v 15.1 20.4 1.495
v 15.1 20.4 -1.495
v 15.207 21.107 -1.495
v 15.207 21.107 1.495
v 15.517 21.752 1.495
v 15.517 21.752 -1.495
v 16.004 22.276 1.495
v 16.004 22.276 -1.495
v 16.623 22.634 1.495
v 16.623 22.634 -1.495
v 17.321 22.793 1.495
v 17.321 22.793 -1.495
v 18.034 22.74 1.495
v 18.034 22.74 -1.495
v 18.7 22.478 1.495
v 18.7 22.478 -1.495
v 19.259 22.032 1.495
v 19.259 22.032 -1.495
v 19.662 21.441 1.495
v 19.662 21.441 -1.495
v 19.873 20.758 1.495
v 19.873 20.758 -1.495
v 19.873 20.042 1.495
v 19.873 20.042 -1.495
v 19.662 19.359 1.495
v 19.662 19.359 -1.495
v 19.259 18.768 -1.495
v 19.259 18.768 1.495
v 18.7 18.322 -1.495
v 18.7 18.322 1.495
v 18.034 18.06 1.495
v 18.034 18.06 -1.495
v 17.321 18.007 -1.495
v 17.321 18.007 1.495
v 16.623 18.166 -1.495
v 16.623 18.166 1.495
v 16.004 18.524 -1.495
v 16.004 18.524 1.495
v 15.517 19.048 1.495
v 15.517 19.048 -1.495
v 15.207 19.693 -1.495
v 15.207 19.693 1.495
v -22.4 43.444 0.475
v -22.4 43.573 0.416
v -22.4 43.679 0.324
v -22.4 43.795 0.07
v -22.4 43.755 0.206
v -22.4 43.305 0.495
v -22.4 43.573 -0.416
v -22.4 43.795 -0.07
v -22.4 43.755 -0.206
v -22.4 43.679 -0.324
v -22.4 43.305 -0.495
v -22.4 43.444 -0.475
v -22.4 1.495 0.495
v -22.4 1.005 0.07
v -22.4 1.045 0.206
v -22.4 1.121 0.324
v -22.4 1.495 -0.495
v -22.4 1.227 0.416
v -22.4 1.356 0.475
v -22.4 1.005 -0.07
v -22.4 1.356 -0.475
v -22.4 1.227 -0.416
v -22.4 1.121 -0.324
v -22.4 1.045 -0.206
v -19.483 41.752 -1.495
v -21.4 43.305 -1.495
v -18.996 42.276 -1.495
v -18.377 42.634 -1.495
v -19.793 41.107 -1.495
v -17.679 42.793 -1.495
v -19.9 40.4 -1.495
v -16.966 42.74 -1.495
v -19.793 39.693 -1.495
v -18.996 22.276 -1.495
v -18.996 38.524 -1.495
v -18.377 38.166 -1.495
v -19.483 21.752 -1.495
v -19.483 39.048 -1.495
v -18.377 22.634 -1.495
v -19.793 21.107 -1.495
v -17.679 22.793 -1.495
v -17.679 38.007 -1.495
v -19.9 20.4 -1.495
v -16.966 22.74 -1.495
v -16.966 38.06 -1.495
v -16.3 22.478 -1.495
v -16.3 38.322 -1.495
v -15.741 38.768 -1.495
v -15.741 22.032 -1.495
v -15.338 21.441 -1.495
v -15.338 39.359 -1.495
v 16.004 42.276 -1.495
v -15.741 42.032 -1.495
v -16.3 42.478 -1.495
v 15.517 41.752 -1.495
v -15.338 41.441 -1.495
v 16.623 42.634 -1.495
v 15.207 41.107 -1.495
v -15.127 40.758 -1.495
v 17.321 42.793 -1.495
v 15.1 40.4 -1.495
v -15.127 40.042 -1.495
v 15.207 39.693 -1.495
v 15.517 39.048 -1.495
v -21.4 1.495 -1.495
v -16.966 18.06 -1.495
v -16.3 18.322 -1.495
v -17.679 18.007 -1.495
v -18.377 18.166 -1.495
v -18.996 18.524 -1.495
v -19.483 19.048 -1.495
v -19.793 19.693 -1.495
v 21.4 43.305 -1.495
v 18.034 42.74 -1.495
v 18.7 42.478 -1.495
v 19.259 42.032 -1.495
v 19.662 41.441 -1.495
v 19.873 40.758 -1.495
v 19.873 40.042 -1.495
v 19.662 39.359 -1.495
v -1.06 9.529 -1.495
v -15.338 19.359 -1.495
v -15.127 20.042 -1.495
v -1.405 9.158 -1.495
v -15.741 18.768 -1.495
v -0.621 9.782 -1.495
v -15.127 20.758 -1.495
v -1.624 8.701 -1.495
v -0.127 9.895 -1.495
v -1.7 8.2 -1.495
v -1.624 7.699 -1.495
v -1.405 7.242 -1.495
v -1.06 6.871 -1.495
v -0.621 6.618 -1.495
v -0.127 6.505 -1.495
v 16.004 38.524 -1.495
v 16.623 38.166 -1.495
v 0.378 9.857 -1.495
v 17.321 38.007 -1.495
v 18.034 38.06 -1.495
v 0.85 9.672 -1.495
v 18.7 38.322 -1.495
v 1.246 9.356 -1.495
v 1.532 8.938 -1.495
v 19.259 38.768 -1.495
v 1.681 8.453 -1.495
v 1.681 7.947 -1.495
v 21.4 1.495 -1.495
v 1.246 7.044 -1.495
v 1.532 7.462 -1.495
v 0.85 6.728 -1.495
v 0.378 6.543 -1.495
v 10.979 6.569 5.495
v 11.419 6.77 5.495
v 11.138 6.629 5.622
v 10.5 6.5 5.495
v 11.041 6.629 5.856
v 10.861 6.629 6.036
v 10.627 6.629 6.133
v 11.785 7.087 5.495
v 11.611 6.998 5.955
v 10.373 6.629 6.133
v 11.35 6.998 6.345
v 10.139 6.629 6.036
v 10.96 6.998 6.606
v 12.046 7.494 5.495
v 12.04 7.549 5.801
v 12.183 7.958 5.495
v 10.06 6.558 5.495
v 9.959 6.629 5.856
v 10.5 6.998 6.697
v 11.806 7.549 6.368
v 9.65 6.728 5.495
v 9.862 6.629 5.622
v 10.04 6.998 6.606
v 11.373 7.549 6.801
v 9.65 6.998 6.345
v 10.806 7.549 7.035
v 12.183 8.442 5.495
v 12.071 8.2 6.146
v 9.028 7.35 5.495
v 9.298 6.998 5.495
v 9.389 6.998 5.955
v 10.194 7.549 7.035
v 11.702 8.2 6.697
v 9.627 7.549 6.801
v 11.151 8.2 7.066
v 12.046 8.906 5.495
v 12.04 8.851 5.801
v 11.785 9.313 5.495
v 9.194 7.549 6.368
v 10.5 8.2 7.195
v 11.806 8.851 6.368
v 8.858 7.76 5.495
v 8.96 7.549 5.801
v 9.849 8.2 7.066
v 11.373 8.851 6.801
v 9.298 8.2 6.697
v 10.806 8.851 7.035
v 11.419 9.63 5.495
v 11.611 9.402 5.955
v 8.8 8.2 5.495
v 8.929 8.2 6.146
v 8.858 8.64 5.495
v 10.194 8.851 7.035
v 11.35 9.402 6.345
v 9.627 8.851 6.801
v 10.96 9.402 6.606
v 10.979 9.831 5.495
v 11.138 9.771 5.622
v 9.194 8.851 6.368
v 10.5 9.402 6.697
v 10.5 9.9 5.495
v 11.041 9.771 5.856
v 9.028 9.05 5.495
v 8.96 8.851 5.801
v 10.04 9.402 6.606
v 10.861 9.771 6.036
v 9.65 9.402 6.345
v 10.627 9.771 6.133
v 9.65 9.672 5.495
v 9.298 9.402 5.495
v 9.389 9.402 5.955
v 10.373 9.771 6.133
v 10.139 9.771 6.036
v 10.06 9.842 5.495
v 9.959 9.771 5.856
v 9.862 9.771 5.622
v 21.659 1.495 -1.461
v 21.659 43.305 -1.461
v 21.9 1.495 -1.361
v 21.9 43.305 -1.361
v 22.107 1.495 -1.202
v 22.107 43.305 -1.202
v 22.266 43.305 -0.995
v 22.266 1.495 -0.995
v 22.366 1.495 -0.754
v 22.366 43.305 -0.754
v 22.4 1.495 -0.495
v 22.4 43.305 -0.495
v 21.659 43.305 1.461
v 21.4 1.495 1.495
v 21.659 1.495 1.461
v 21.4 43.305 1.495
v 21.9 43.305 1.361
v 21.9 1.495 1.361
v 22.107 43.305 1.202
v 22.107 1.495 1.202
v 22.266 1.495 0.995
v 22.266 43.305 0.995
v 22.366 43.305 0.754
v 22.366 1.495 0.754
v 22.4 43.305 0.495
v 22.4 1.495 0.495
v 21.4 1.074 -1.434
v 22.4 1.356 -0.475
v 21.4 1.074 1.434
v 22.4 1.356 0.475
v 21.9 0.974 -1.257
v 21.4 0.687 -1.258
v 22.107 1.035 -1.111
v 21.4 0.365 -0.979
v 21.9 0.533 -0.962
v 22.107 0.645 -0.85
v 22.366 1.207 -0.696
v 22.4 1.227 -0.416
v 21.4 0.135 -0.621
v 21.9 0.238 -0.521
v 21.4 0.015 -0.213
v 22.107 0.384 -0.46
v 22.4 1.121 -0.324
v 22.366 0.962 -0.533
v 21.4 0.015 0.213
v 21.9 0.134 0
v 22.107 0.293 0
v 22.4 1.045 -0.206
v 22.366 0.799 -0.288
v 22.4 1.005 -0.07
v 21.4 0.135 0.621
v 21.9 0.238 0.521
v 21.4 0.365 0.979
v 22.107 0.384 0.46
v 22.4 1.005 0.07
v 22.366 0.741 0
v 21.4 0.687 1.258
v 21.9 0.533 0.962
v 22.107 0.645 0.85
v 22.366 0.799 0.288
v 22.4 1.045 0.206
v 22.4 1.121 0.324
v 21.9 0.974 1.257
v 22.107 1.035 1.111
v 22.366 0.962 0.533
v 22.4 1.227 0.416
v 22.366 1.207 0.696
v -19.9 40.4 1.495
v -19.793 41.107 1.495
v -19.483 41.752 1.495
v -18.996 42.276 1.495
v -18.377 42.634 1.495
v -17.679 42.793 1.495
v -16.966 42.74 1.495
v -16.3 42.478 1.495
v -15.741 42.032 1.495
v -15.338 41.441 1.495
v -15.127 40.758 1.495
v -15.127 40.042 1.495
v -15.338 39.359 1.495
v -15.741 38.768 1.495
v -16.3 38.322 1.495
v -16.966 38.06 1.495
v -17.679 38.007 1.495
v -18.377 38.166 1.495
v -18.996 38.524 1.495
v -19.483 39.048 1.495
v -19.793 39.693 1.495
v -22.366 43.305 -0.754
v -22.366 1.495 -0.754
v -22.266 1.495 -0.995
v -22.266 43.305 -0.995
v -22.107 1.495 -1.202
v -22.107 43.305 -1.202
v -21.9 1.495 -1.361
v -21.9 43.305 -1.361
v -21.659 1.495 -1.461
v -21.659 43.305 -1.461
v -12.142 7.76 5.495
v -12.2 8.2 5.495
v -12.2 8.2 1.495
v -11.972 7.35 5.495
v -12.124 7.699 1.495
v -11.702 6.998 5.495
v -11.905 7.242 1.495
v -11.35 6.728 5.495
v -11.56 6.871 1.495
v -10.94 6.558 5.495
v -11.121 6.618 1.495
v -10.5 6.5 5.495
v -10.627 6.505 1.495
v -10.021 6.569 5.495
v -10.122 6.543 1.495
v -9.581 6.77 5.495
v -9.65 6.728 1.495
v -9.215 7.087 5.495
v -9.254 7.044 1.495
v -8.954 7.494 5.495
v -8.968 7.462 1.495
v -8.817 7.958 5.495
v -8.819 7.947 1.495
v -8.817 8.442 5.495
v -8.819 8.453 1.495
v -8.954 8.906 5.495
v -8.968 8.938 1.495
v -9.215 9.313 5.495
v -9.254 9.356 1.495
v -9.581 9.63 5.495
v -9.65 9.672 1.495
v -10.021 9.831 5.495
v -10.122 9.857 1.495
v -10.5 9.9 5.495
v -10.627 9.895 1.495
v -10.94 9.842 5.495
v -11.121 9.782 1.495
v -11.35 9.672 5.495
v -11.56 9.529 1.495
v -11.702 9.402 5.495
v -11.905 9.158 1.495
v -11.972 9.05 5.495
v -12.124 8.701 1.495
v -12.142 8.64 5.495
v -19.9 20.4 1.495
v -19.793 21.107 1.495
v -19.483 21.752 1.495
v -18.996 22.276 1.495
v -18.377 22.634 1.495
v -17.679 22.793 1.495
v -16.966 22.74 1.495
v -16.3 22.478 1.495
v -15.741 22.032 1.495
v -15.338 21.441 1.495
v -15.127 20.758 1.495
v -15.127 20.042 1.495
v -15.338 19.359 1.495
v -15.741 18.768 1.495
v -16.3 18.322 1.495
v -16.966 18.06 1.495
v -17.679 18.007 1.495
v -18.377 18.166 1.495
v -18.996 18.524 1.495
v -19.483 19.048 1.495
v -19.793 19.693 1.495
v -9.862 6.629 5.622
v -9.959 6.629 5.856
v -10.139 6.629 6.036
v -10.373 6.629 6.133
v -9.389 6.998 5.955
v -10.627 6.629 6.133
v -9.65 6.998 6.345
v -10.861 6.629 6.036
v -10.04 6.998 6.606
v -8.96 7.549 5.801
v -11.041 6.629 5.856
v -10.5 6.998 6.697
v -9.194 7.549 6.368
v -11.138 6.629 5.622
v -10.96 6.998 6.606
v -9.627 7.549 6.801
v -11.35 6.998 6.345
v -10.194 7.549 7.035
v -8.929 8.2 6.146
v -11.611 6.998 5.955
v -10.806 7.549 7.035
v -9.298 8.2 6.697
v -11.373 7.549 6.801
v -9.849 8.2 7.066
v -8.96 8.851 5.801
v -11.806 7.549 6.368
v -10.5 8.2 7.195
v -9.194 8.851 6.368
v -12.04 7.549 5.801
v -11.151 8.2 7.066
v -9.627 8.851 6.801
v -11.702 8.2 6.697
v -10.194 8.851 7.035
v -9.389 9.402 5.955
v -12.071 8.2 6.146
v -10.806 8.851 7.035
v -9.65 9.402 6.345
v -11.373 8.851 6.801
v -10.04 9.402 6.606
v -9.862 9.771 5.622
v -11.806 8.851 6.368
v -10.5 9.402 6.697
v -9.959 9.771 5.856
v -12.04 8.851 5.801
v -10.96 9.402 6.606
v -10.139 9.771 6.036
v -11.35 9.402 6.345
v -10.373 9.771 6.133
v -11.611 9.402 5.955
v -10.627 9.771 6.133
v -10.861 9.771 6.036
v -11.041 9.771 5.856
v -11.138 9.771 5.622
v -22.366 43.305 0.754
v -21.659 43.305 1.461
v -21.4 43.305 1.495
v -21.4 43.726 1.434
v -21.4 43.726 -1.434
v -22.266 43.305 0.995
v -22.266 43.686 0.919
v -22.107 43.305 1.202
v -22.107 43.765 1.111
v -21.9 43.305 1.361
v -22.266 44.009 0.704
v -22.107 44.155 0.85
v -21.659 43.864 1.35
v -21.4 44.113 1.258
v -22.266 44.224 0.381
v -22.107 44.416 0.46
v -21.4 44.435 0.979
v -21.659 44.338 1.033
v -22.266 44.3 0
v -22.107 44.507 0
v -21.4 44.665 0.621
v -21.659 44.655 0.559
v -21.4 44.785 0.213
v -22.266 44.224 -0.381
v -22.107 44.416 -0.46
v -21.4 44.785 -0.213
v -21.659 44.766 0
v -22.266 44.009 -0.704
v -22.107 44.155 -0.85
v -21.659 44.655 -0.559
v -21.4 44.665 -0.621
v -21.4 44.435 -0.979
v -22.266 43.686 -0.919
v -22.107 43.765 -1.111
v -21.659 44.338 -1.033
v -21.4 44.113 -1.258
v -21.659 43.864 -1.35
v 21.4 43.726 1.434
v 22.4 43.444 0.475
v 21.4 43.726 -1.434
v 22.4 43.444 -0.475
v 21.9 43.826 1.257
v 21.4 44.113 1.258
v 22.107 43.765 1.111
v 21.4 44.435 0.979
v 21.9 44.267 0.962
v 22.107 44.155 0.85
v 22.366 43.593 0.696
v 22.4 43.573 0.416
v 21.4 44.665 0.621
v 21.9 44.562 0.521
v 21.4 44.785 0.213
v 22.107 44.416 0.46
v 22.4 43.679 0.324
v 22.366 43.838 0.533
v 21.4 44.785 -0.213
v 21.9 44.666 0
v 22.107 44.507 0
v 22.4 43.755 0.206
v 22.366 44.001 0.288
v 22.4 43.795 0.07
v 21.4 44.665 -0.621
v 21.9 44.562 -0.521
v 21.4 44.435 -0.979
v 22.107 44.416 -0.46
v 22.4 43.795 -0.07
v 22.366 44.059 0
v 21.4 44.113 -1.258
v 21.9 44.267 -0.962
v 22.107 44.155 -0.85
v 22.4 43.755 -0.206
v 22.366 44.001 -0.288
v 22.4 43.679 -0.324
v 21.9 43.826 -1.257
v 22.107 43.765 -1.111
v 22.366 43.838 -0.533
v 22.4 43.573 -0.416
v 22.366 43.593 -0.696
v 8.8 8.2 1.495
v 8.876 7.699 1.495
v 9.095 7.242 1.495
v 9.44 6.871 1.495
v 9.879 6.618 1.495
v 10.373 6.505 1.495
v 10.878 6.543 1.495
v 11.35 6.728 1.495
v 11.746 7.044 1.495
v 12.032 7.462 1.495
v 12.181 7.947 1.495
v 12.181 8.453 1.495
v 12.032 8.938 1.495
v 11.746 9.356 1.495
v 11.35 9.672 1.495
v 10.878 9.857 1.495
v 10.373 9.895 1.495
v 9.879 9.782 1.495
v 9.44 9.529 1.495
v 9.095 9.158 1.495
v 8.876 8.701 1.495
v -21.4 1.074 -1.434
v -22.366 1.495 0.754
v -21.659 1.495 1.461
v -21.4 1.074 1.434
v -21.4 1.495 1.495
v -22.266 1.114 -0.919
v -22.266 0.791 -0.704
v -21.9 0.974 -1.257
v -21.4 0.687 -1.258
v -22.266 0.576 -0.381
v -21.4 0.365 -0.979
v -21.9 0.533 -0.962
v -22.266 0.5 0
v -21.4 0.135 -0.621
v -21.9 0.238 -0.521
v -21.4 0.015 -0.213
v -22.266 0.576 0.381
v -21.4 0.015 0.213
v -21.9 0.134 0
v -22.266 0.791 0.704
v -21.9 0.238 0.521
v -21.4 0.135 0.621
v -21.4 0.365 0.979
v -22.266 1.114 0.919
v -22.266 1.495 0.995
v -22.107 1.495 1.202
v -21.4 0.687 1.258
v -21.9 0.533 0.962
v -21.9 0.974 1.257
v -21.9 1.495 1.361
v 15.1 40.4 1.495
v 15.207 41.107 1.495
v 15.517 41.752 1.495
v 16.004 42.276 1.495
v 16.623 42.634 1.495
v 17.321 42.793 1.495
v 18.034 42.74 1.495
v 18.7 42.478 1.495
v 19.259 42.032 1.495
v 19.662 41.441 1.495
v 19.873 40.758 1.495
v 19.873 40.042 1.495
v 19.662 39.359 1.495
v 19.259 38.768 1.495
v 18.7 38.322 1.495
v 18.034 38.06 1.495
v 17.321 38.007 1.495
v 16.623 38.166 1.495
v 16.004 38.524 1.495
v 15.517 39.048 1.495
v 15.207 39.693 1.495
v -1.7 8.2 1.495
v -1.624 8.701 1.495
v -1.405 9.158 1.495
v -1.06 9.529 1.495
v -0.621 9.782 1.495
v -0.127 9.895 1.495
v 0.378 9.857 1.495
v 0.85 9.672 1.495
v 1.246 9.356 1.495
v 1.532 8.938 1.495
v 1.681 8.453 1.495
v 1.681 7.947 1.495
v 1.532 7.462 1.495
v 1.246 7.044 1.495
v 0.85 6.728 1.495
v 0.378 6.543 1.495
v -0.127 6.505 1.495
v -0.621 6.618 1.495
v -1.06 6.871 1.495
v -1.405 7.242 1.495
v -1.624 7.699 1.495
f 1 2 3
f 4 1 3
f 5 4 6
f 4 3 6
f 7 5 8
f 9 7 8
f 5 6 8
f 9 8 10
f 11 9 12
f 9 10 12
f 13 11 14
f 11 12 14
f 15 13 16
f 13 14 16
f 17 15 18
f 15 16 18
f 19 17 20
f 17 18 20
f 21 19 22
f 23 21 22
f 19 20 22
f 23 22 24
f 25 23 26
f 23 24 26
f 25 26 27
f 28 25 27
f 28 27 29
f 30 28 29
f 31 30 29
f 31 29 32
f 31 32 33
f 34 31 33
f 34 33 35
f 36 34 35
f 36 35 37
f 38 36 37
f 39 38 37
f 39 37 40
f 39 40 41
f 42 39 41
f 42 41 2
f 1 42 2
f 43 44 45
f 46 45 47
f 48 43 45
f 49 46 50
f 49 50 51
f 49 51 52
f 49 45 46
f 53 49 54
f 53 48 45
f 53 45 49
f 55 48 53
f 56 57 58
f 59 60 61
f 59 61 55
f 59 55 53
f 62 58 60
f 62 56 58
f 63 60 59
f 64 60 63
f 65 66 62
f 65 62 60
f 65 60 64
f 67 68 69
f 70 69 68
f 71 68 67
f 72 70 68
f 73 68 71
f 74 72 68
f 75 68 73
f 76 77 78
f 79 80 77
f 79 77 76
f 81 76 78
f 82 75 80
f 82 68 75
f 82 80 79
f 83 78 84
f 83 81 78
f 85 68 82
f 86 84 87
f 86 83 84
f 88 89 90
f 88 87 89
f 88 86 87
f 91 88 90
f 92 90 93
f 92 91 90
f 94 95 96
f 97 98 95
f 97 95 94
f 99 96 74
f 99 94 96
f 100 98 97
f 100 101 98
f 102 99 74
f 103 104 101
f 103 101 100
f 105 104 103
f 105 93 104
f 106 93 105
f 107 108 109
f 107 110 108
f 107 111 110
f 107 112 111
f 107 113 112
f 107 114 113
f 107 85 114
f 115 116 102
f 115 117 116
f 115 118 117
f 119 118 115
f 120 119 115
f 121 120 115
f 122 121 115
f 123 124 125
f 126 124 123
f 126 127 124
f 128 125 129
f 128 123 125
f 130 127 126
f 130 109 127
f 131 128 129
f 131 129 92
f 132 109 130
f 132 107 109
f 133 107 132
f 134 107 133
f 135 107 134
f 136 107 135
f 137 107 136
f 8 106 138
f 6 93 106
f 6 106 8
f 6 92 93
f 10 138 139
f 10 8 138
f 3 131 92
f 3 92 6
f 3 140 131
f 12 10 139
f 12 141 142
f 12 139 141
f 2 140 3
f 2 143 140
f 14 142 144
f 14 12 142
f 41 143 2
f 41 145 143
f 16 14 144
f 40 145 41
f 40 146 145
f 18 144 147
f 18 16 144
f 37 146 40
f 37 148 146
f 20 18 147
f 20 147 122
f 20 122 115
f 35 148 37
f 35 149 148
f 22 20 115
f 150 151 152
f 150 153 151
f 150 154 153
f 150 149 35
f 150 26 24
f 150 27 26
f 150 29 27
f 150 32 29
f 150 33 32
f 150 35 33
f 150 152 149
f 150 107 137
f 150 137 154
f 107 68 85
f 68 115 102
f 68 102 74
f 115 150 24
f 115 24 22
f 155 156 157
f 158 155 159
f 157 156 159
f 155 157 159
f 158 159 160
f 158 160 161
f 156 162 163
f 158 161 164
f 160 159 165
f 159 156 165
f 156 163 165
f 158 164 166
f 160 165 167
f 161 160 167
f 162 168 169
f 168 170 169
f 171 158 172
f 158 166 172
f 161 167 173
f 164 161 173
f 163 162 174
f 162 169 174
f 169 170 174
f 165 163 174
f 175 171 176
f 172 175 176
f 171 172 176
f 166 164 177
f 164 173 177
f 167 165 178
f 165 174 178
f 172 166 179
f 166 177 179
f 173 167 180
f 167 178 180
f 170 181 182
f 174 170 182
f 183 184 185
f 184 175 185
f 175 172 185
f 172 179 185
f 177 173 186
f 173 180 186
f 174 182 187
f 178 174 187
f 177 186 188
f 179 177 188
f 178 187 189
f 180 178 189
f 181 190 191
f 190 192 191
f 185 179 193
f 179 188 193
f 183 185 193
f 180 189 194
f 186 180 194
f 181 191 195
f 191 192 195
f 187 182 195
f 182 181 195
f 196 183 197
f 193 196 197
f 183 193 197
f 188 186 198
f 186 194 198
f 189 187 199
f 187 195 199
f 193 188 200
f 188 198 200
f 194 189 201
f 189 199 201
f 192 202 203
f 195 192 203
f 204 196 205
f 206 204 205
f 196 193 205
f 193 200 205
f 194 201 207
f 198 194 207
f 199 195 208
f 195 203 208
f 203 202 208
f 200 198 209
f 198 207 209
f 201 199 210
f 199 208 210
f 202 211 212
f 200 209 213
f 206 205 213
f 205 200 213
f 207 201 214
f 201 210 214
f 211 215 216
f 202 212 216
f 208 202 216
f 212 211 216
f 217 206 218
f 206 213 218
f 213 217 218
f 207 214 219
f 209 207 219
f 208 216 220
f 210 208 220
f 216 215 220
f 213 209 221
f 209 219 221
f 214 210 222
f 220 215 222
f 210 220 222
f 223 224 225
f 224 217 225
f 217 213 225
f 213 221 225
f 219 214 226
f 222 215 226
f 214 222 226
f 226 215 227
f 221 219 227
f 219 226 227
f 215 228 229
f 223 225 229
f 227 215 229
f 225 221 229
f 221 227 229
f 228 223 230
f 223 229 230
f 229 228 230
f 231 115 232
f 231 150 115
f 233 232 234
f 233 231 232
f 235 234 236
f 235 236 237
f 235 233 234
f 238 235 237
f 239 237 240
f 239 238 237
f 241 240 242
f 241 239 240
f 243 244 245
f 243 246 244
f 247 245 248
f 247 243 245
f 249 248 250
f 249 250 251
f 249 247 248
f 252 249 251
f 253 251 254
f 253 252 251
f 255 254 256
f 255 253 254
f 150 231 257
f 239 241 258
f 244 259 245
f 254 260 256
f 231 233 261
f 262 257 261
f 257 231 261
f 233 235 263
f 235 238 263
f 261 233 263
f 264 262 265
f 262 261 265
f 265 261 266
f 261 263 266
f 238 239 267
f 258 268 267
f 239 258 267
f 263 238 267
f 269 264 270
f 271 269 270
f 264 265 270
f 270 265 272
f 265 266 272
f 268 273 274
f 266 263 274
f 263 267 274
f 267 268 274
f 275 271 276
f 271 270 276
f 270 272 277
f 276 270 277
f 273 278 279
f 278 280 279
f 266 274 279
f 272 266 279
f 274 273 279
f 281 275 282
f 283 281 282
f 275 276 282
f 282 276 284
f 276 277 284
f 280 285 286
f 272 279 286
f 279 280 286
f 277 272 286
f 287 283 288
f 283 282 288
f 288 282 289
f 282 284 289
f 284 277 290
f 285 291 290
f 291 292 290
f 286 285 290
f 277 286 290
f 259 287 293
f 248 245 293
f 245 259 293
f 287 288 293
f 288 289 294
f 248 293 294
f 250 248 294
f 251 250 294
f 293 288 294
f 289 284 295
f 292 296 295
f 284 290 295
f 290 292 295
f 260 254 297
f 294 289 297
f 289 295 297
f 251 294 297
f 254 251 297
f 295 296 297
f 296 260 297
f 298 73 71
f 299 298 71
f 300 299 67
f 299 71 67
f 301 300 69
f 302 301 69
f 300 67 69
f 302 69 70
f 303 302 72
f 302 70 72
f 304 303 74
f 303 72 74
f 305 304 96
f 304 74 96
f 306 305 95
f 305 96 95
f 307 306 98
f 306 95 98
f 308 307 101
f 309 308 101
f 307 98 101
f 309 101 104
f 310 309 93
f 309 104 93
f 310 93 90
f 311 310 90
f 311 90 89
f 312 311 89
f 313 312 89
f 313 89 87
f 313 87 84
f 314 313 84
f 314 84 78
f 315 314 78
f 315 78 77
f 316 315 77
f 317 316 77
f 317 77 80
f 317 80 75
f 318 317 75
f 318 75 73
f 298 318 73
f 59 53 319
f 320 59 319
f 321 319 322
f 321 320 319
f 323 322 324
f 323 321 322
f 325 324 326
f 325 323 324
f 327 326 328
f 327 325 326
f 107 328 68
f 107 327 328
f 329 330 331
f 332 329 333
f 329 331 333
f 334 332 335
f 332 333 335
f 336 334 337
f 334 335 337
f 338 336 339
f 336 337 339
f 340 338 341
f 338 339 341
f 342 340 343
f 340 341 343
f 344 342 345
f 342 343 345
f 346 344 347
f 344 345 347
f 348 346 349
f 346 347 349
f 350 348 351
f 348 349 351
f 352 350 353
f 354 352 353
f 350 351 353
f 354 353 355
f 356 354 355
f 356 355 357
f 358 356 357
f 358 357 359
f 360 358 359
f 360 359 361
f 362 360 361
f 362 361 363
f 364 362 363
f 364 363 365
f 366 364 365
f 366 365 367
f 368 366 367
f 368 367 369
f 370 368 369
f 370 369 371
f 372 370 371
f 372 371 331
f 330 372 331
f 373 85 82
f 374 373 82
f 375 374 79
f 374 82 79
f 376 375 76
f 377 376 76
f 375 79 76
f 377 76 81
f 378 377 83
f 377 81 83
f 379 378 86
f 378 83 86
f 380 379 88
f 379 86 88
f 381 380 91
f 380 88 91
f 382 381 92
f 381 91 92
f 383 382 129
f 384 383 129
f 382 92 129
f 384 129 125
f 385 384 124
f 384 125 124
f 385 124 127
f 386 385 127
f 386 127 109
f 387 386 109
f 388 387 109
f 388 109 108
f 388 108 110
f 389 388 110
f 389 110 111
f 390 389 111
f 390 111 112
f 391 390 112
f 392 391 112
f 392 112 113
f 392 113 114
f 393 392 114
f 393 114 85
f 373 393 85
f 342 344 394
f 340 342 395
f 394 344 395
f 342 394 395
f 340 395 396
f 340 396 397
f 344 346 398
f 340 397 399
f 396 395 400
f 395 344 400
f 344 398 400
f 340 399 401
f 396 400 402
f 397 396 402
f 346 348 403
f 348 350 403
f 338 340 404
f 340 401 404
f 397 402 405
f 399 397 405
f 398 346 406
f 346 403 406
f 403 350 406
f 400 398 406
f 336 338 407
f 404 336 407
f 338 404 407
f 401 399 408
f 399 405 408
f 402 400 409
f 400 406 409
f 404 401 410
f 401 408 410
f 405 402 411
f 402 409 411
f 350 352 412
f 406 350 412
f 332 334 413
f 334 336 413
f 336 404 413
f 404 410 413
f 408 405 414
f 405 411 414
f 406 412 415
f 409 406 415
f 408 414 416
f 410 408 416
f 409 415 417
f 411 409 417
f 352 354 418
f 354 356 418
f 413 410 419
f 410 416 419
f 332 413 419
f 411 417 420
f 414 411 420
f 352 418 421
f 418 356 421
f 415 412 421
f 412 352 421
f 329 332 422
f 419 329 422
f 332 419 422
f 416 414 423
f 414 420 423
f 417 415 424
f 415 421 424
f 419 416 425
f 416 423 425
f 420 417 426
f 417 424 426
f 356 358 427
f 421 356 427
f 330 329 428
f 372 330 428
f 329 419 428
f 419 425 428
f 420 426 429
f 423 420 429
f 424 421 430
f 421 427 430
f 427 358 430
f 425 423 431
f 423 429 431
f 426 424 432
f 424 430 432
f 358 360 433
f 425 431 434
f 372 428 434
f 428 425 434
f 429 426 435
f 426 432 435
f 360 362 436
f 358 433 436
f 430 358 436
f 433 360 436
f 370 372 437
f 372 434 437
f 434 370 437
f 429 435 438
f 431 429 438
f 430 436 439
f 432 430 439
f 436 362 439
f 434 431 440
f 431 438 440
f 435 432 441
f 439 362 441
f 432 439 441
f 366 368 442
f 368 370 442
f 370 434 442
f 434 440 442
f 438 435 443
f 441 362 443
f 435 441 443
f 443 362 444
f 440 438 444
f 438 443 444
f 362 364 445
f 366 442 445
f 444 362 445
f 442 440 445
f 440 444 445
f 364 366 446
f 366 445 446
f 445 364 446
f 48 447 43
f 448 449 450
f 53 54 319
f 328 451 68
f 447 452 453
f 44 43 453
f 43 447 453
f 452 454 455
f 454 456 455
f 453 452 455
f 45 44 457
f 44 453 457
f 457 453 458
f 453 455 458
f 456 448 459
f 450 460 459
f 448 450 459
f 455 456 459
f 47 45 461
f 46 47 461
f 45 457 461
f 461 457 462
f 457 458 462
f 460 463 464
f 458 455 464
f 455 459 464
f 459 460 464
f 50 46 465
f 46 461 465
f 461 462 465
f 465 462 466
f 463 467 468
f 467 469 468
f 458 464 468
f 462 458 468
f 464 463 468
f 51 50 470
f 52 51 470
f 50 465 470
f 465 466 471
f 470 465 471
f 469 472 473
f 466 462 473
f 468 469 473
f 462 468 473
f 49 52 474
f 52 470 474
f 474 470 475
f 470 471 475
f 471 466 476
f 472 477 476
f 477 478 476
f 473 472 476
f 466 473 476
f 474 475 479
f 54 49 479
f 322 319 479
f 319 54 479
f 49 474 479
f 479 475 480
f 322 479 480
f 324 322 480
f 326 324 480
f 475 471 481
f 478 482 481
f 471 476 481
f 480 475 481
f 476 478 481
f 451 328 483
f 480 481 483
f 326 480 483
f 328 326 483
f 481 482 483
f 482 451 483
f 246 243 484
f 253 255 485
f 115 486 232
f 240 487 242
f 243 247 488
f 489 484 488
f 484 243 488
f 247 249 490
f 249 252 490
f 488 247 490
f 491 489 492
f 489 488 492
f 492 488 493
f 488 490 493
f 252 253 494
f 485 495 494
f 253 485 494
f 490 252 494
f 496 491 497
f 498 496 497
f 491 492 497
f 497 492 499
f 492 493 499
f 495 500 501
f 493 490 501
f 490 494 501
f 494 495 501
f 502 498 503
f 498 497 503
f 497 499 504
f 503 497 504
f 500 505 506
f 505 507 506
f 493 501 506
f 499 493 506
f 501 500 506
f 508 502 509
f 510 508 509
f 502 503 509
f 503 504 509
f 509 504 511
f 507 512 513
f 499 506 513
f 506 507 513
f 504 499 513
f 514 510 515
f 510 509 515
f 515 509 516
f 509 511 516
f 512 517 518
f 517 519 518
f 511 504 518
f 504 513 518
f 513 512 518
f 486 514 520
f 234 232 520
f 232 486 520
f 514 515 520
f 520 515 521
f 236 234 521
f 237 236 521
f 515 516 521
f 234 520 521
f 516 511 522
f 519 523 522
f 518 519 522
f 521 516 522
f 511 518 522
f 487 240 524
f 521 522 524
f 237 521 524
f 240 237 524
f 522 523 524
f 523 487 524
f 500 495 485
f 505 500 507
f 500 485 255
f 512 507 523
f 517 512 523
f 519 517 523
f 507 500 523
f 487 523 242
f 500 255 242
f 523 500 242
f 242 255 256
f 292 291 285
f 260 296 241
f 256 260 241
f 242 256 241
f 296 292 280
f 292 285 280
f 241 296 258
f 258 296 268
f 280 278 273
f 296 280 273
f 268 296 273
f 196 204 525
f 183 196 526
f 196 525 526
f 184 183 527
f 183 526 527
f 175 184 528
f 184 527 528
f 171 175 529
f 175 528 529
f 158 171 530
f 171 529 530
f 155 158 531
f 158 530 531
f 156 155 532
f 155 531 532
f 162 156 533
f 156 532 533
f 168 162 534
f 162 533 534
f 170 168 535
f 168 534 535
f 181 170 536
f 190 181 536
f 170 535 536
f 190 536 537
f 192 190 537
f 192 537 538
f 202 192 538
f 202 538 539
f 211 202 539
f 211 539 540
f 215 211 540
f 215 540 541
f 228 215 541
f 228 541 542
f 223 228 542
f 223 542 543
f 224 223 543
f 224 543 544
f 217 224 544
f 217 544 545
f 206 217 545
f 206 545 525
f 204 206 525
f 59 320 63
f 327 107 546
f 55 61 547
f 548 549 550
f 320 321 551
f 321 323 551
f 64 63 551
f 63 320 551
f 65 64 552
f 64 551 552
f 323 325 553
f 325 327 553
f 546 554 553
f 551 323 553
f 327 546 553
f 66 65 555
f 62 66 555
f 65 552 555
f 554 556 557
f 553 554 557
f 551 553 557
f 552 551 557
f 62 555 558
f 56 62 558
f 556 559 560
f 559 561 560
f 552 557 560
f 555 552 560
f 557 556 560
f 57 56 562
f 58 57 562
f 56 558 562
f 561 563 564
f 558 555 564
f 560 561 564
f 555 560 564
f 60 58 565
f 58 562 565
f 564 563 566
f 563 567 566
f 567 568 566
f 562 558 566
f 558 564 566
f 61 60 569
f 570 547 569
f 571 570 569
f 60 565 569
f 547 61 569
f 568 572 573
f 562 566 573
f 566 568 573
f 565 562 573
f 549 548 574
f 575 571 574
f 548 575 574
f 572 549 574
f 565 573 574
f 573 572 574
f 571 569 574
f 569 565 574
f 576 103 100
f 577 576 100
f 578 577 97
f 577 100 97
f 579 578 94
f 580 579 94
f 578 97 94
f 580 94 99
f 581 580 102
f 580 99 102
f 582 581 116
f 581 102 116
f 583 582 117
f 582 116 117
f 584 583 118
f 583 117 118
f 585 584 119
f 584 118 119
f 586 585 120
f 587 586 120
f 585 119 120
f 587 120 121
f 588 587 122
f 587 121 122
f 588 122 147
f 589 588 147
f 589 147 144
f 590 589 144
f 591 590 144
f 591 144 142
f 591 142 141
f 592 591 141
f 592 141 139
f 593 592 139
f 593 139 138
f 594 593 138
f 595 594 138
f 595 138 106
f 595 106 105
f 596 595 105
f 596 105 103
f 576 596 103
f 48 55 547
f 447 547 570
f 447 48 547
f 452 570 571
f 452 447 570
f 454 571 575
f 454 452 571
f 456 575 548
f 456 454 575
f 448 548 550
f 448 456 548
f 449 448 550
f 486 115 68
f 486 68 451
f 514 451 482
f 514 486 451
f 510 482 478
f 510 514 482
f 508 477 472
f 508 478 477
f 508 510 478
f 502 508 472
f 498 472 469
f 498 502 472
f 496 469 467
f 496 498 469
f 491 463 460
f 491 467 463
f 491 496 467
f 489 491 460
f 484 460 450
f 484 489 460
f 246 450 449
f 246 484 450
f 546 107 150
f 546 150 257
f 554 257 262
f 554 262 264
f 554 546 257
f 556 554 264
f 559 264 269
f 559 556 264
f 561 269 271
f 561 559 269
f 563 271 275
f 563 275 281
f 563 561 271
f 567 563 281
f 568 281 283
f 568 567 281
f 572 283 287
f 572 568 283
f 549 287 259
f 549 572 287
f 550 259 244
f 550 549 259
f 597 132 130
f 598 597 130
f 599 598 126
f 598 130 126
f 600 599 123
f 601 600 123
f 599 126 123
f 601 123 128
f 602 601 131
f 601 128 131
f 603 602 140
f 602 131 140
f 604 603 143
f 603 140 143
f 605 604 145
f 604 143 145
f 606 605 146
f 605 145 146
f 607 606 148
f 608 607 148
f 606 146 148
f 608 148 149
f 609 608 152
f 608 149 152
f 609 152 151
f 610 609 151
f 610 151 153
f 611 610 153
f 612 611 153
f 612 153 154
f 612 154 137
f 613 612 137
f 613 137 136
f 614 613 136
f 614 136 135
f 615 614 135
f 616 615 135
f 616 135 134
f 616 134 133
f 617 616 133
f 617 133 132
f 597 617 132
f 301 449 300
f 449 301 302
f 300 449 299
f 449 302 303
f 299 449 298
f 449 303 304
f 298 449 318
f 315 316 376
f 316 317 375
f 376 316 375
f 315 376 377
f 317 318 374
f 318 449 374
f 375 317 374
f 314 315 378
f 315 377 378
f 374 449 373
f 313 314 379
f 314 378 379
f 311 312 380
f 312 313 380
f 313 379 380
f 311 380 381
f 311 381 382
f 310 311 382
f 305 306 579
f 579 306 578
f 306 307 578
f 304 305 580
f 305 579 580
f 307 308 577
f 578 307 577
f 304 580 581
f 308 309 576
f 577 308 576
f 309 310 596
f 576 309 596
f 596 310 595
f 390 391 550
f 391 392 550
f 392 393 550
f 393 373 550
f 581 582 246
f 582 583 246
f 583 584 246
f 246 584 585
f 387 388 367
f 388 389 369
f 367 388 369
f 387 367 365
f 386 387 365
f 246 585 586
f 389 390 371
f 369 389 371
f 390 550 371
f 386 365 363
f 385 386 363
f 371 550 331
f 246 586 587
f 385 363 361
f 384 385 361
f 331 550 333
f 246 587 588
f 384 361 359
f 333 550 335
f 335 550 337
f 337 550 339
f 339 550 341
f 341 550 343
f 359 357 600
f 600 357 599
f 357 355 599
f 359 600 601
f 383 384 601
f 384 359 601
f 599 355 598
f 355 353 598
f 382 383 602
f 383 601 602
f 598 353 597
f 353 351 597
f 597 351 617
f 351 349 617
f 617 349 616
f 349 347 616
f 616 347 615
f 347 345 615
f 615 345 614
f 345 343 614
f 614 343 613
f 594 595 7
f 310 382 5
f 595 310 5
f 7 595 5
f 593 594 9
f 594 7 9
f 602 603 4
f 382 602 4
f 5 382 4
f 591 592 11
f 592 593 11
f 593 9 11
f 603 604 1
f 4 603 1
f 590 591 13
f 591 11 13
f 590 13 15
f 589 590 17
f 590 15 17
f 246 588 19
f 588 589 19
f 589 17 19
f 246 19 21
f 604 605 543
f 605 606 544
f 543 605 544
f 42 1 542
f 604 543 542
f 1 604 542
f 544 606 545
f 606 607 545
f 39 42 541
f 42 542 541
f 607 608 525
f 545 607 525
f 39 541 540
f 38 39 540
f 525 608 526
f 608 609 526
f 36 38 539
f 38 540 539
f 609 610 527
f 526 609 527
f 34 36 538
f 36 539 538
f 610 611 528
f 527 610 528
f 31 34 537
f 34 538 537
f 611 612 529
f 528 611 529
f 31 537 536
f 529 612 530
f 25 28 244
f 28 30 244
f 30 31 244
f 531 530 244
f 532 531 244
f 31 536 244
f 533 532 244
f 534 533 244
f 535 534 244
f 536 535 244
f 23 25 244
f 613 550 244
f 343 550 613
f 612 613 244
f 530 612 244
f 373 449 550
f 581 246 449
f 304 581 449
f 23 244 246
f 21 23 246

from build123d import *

# Parameters (mm, degrees)
SKETCH1_W            = 44.8
SKETCH1_H            = 2.99
BOSS_EXTRUDE1_DEPTH  = 44.8
FILLET1_RADIUS       = 1.495
FILLET1_LENGTH       = 44.8
M4_CLEARANCE_HOLE1_D = 4.8
M3_CLEARANCE_HOLE1_D = 3.4
SKETCH8_R            = 1.7
BOSS_EXTRUDE2_DEPTH  = 4
REVOLVE1_ANGLE       = 180
REVOLVE2_ANGLE       = 180
FILLET2_RADIUS       = 1.495
FILLET2_LENGTH       = 44.8
FILLET3_R            = 1
FILLET4_R            = 1


with BuildPart() as part:
    # Sketch1 → Boss-Extrude1 (new body)
    with BuildSketch(Plane(origin=(0, 0, 0), x_dir=(1, 0, 0), z_dir=(0, 1, 0))):
        Rectangle(SKETCH1_W, SKETCH1_H)
    extrude(amount=BOSS_EXTRUDE1_DEPTH)

    # Fillet1: full round fillet: the end face becomes a half cylinder, R = half its width
    fillet1_face = Plane((0, 0, 0), x_dir=(-1, 0, 0), z_dir=(0, -1, 0))  # on the end face: x along it, z out of the body
    fillet1_slab = fillet1_face.offset(-FILLET1_RADIUS / 2) * Box(FILLET1_LENGTH, 2 * FILLET1_RADIUS, FILLET1_RADIUS, mode=Mode.PRIVATE)  # the body's end, R deep
    fillet1_round = Plane((0, 1.495, 0), x_dir=(0, -1, 0), z_dir=(-1, 0, 0)) * Cylinder(FILLET1_RADIUS, FILLET1_LENGTH, mode=Mode.PRIVATE)  # its axis R under the face
    add(fillet1_slab - fillet1_round, mode=Mode.SUBTRACT)

    # M4 Clearance Hole1 (through all)
    with Locations(Plane.XY.offset(1.495)):
        with Locations((-17.5, 40.4), (-17.5, 20.4), (17.5, 20.4), (17.5, 40.4)):
            Hole(M4_CLEARANCE_HOLE1_D / 2)

    # M3 Clearance Hole1 (through all)
    with Locations(Plane.XY.offset(1.495)):
        with Locations((0, 8.2)):
            Hole(M3_CLEARANCE_HOLE1_D / 2)

    # Sketch8 → Boss-Extrude2 (add)
    with BuildSketch(Plane.XY.offset(1.495)):
        with Locations(Location((-10.5, 8.2, 0), (0, 0, 180))):
            Circle(SKETCH8_R)
        with Locations(Location((10.5, 8.2, 0), (0, 0, 180))):
            Circle(SKETCH8_R)
    extrude(amount=BOSS_EXTRUDE2_DEPTH)

    # Sketch9 → Revolve1 (revolve)
    with BuildSketch(Plane.XY.offset(5.495)):
        with BuildLine():
            Line((-10.5, 9.9), (-10.5, 6.5))
            ThreePointArc((-10.5, 6.5), (-8.8, 8.2), (-10.5, 9.9))
        make_face()
    revolve(axis=Axis((-10.5, 9.9, 5.495), (0, -1, 0)), revolution_arc=REVOLVE1_ANGLE)

    # Sketch10 → Revolve2 (revolve)
    with BuildSketch(Plane.XY.offset(5.495)):
        with BuildLine():
            Line((10.5, 9.9), (10.5, 6.5))
            ThreePointArc((10.5, 6.5), (12.2, 8.2), (10.5, 9.9))
        make_face()
    revolve(axis=Axis((10.5, 9.9, 5.495), (0, -1, 0)), revolution_arc=REVOLVE2_ANGLE)

    # Fillet2: full round fillet: the end face becomes a half cylinder, R = half its width
    fillet2_face = Plane((0, 44.8, 0), x_dir=(1, 0, 0), z_dir=(0, 1, 0))  # on the end face: x along it, z out of the body
    fillet2_slab = fillet2_face.offset(-FILLET2_RADIUS / 2) * Box(FILLET2_LENGTH, 2 * FILLET2_RADIUS, FILLET2_RADIUS, mode=Mode.PRIVATE)  # the body's end, R deep
    fillet2_round = Plane((0, 43.305, 0), x_dir=(0, 1, 0), z_dir=(1, 0, 0)) * Cylinder(FILLET2_RADIUS, FILLET2_LENGTH, mode=Mode.PRIVATE)  # its axis R under the face
    add(fillet2_slab - fillet2_round, mode=Mode.SUBTRACT)

    # Fillet3
    fillet3_edges = [part.edges().sort_by_distance(p)[0] for p in [
        (-22.4, 0, 0),
        (-22.4, 22.4, 1.495),
        (-22.4, 22.4, -1.495),
        (-22.4, 44.8, 0),
    ]]
    fillet(fillet3_edges, radius=FILLET3_R)

    # Fillet4
    fillet4_edges = [part.edges().sort_by_distance(p)[0] for p in [
        (22.4, 0, 0),
        (22.4, 22.4, 1.495),
        (22.4, 22.4, -1.495),
        (22.4, 44.8, 0),
    ]]
    fillet(fillet4_edges, radius=FILLET4_R)


solid = part.part
